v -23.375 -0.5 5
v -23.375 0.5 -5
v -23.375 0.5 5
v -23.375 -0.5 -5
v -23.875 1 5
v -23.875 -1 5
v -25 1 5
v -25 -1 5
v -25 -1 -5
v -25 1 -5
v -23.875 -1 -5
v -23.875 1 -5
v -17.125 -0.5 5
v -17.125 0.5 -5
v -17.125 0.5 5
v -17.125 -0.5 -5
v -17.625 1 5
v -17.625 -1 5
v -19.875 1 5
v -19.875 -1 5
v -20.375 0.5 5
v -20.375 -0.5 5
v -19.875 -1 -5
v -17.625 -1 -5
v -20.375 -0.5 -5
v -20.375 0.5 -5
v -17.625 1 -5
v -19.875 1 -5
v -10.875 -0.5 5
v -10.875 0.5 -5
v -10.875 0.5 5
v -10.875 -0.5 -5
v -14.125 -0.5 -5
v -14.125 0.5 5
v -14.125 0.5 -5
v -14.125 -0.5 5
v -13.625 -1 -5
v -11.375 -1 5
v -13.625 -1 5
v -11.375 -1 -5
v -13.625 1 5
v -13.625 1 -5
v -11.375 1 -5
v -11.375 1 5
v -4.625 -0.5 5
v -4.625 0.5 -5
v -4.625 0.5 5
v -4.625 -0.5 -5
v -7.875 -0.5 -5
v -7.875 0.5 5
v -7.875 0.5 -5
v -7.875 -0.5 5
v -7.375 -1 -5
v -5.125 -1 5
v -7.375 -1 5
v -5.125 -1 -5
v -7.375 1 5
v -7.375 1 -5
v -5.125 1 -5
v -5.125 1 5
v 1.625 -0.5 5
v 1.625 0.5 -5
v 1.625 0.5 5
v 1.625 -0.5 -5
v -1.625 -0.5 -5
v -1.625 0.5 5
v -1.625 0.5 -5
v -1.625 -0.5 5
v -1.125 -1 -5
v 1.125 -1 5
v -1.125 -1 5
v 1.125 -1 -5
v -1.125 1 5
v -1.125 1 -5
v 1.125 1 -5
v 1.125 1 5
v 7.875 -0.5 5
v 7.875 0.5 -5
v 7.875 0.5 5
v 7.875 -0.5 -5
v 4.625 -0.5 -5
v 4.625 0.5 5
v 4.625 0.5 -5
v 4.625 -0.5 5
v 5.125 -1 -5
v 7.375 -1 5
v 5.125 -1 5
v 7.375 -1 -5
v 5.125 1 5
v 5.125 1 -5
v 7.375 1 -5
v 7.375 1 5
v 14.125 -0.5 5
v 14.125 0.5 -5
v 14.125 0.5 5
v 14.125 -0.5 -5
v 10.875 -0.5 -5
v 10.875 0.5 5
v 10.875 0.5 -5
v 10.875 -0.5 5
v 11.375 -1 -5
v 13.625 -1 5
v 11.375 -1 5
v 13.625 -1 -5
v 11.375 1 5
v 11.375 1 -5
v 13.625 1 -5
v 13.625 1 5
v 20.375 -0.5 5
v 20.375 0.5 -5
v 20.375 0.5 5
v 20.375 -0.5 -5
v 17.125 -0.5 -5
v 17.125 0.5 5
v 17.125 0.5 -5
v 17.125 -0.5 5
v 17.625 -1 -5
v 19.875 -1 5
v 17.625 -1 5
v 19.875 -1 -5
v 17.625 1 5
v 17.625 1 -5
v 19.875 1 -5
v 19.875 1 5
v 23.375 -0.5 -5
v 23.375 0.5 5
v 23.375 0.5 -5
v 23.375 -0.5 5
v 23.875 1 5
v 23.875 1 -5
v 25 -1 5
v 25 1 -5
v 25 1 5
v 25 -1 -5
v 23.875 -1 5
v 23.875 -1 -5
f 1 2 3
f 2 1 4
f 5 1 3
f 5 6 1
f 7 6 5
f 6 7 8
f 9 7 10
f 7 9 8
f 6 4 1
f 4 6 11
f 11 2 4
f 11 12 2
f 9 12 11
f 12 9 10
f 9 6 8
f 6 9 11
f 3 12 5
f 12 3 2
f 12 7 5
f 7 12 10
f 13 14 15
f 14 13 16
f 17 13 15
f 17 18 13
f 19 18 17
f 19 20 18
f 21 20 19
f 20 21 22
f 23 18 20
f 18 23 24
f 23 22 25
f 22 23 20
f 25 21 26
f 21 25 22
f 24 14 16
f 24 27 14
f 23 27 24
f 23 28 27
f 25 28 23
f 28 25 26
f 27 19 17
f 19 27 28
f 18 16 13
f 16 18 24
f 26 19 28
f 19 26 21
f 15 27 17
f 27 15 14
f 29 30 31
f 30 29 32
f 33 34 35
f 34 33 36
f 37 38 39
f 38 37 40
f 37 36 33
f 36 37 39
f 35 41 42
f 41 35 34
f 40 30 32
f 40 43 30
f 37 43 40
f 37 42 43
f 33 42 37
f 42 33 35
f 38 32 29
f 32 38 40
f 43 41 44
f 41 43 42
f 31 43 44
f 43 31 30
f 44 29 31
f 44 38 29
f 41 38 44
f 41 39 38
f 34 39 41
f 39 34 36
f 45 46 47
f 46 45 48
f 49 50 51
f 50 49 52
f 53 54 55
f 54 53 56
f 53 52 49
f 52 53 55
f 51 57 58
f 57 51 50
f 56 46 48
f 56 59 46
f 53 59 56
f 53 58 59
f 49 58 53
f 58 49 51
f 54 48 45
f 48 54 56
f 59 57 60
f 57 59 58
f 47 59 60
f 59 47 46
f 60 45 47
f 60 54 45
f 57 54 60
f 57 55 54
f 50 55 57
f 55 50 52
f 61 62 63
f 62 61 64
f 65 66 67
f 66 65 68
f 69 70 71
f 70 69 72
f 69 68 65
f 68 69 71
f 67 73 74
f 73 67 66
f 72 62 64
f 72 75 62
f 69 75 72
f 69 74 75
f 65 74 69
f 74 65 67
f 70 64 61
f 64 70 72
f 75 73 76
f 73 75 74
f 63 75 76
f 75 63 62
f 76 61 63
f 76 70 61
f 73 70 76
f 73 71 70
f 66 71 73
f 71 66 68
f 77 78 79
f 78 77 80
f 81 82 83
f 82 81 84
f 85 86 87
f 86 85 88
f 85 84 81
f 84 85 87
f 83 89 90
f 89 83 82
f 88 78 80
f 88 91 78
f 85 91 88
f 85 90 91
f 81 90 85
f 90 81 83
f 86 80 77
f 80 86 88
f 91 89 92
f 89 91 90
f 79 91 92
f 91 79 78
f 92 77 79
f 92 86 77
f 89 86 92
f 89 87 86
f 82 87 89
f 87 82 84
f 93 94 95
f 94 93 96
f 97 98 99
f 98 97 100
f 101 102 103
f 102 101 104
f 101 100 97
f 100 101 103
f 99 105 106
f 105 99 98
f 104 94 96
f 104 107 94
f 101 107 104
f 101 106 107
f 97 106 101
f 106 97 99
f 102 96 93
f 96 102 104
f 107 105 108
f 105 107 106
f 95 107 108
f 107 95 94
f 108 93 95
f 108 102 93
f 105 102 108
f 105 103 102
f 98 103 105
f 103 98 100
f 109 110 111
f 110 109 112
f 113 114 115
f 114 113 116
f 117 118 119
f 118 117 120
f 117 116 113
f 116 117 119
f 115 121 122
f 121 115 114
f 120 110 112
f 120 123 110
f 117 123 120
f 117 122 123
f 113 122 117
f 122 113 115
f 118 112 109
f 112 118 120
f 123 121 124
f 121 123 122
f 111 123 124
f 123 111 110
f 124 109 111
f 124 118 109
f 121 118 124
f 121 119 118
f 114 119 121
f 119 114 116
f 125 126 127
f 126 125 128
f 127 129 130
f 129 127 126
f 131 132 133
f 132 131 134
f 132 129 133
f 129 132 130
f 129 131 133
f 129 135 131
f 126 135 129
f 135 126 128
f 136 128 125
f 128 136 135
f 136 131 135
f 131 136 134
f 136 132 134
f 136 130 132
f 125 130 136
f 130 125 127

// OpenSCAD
// Start: lazy_union
default_5_default_5();
// End: lazy_union

// Modules.

// 'PartMaterial undef-default - default 5.0'
module default_5_default_5() {
  // 'None : _combine_solids_and_holes'
  union() {
    // 'default : _combine_solids_and_holes'
    union() {
      // ('vane', 'left')
      multmatrix(m=[[0.0, 1.0, 0.0, -25.0], [-1.0, 0.0, 0.0, 0.0], [0.0, 0.0, 1.0, -5.0], [0.0, 0.0, 0.0, 1.0]]) {
        // "('vane', 'left') : _combine_solids_and_holes"
        union() {
          // ('vane', 'left')
          linear_extrude(height=10.0, twist=0.0, slices=4, scale=[1.0, 1.0]) {
            polygon(points=[[0.0, 0.0], [-1.0, 0.0], [-1.0, 1.125], [-0.5, 1.625], [0.5, 1.625], [1.0, 1.125], [1.0, 0.0]]);
          }
        }
      }
      // ('vane', 0)
      multmatrix(m=[[0.0, 1.0, 0.0, -18.75], [-1.0, 0.0, 0.0, 0.0], [0.0, 0.0, 1.0, -5.0], [0.0, 0.0, 0.0, 1.0]]) {
        // "('vane', 0) : _combine_solids_and_holes"
        union() {
          // ('vane', 0)
          linear_extrude(height=10.0, twist=0.0, slices=4, scale=[1.0, 1.0]) {
            polygon(points=[[0.0, 0.0], [-1.0, 0.0], [-1.0, 1.125], [-0.5, 1.625], [0.5, 1.625], [1.0, 1.125], [1.0, -1.125], [0.5, -1.625], [-0.5, -1.625], [-1.0, -1.125], [-1.0, 0.0]]);
          }
        }
      }
      // ('vane', 1)
      multmatrix(m=[[0.0, 1.0, 0.0, -12.5], [-1.0, 0.0, 0.0, 0.0], [0.0, 0.0, 1.0, -5.0], [0.0, 0.0, 0.0, 1.0]]) {
        // "('vane', 1) : _combine_solids_and_holes"
        union() {
          // ('vane', 1)
          linear_extrude(height=10.0, twist=0.0, slices=4, scale=[1.0, 1.0]) {
            polygon(points=[[0.0, 0.0], [-1.0, 0.0], [-1.0, 1.125], [-0.5, 1.625], [0.5, 1.625], [1.0, 1.125], [1.0, -1.125], [0.5, -1.625], [-0.5, -1.625], [-1.0, -1.125], [-1.0, 0.0]]);
          }
        }
      }
      // ('vane', 2)
      multmatrix(m=[[0.0, 1.0, 0.0, -6.25], [-1.0, 0.0, 0.0, 0.0], [0.0, 0.0, 1.0, -5.0], [0.0, 0.0, 0.0, 1.0]]) {
        // "('vane', 2) : _combine_solids_and_holes"
        union() {
          // ('vane', 2)
          linear_extrude(height=10.0, twist=0.0, slices=4, scale=[1.0, 1.0]) {
            polygon(points=[[0.0, 0.0], [-1.0, 0.0], [-1.0, 1.125], [-0.5, 1.625], [0.5, 1.625], [1.0, 1.125], [1.0, -1.125], [0.5, -1.625], [-0.5, -1.625], [-1.0, -1.125], [-1.0, 0.0]]);
          }
        }
      }
      // ('vane', 3)
      multmatrix(m=[[0.0, 1.0, 0.0, 0.0], [-1.0, 0.0, 0.0, 0.0], [0.0, 0.0, 1.0, -5.0], [0.0, 0.0, 0.0, 1.0]]) {
        // "('vane', 3) : _combine_solids_and_holes"
        union() {
          // ('vane', 3)
          linear_extrude(height=10.0, twist=0.0, slices=4, scale=[1.0, 1.0]) {
            polygon(points=[[0.0, 0.0], [-1.0, 0.0], [-1.0, 1.125], [-0.5, 1.625], [0.5, 1.625], [1.0, 1.125], [1.0, -1.125], [0.5, -1.625], [-0.5, -1.625], [-1.0, -1.125], [-1.0, 0.0]]);
          }
        }
      }
      // ('vane', 4)
      multmatrix(m=[[0.0, 1.0, 0.0, 6.25], [-1.0, 0.0, 0.0, 0.0], [0.0, 0.0, 1.0, -5.0], [0.0, 0.0, 0.0, 1.0]]) {
        // "('vane', 4) : _combine_solids_and_holes"
        union() {
          // ('vane', 4)
          linear_extrude(height=10.0, twist=0.0, slices=4, scale=[1.0, 1.0]) {
            polygon(points=[[0.0, 0.0], [-1.0, 0.0], [-1.0, 1.125], [-0.5, 1.625], [0.5, 1.625], [1.0, 1.125], [1.0, -1.125], [0.5, -1.625], [-0.5, -1.625], [-1.0, -1.125], [-1.0, 0.0]]);
          }
        }
      }
      // ('vane', 5)
      multmatrix(m=[[0.0, 1.0, 0.0, 12.5], [-1.0, 0.0, 0.0, 0.0], [0.0, 0.0, 1.0, -5.0], [0.0, 0.0, 0.0, 1.0]]) {
        // "('vane', 5) : _combine_solids_and_holes"
        union() {
          // ('vane', 5)
          linear_extrude(height=10.0, twist=0.0, slices=4, scale=[1.0, 1.0]) {
            polygon(points=[[0.0, 0.0], [-1.0, 0.0], [-1.0, 1.125], [-0.5, 1.625], [0.5, 1.625], [1.0, 1.125], [1.0, -1.125], [0.5, -1.625], [-0.5, -1.625], [-1.0, -1.125], [-1.0, 0.0]]);
          }
        }
      }
      // ('vane', 6)
      multmatrix(m=[[0.0, 1.0, 0.0, 18.75], [-1.0, 0.0, 0.0, 0.0], [0.0, 0.0, 1.0, -5.0], [0.0, 0.0, 0.0, 1.0]]) {
        // "('vane', 6) : _combine_solids_and_holes"
        union() {
          // ('vane', 6)
          linear_extrude(height=10.0, twist=0.0, slices=4, scale=[1.0, 1.0]) {
            polygon(points=[[0.0, 0.0], [-1.0, 0.0], [-1.0, 1.125], [-0.5, 1.625], [0.5, 1.625], [1.0, 1.125], [1.0, -1.125], [0.5, -1.625], [-0.5, -1.625], [-1.0, -1.125], [-1.0, 0.0]]);
          }
        }
      }
      // ('vane', 'right')
      multmatrix(m=[[0.0, -1.0, 0.0, 25.0], [1.0, 0.0, 0.0, 0.0], [0.0, 0.0, 1.0, -5.0], [0.0, 0.0, 0.0, 1.0]]) {
        // "('vane', 'right') : _combine_solids_and_holes"
        union() {
          // ('vane', 'right')
          linear_extrude(height=10.0, twist=0.0, slices=4, scale=[1.0, 1.0]) {
            polygon(points=[[0.0, 0.0], [-1.0, 0.0], [-1.0, 1.125], [-0.5, 1.625], [0.5, 1.625], [1.0, 1.125], [1.0, 0.0]]);
          }
        }
      }
    }
  }
} // end module default_5_default_5
